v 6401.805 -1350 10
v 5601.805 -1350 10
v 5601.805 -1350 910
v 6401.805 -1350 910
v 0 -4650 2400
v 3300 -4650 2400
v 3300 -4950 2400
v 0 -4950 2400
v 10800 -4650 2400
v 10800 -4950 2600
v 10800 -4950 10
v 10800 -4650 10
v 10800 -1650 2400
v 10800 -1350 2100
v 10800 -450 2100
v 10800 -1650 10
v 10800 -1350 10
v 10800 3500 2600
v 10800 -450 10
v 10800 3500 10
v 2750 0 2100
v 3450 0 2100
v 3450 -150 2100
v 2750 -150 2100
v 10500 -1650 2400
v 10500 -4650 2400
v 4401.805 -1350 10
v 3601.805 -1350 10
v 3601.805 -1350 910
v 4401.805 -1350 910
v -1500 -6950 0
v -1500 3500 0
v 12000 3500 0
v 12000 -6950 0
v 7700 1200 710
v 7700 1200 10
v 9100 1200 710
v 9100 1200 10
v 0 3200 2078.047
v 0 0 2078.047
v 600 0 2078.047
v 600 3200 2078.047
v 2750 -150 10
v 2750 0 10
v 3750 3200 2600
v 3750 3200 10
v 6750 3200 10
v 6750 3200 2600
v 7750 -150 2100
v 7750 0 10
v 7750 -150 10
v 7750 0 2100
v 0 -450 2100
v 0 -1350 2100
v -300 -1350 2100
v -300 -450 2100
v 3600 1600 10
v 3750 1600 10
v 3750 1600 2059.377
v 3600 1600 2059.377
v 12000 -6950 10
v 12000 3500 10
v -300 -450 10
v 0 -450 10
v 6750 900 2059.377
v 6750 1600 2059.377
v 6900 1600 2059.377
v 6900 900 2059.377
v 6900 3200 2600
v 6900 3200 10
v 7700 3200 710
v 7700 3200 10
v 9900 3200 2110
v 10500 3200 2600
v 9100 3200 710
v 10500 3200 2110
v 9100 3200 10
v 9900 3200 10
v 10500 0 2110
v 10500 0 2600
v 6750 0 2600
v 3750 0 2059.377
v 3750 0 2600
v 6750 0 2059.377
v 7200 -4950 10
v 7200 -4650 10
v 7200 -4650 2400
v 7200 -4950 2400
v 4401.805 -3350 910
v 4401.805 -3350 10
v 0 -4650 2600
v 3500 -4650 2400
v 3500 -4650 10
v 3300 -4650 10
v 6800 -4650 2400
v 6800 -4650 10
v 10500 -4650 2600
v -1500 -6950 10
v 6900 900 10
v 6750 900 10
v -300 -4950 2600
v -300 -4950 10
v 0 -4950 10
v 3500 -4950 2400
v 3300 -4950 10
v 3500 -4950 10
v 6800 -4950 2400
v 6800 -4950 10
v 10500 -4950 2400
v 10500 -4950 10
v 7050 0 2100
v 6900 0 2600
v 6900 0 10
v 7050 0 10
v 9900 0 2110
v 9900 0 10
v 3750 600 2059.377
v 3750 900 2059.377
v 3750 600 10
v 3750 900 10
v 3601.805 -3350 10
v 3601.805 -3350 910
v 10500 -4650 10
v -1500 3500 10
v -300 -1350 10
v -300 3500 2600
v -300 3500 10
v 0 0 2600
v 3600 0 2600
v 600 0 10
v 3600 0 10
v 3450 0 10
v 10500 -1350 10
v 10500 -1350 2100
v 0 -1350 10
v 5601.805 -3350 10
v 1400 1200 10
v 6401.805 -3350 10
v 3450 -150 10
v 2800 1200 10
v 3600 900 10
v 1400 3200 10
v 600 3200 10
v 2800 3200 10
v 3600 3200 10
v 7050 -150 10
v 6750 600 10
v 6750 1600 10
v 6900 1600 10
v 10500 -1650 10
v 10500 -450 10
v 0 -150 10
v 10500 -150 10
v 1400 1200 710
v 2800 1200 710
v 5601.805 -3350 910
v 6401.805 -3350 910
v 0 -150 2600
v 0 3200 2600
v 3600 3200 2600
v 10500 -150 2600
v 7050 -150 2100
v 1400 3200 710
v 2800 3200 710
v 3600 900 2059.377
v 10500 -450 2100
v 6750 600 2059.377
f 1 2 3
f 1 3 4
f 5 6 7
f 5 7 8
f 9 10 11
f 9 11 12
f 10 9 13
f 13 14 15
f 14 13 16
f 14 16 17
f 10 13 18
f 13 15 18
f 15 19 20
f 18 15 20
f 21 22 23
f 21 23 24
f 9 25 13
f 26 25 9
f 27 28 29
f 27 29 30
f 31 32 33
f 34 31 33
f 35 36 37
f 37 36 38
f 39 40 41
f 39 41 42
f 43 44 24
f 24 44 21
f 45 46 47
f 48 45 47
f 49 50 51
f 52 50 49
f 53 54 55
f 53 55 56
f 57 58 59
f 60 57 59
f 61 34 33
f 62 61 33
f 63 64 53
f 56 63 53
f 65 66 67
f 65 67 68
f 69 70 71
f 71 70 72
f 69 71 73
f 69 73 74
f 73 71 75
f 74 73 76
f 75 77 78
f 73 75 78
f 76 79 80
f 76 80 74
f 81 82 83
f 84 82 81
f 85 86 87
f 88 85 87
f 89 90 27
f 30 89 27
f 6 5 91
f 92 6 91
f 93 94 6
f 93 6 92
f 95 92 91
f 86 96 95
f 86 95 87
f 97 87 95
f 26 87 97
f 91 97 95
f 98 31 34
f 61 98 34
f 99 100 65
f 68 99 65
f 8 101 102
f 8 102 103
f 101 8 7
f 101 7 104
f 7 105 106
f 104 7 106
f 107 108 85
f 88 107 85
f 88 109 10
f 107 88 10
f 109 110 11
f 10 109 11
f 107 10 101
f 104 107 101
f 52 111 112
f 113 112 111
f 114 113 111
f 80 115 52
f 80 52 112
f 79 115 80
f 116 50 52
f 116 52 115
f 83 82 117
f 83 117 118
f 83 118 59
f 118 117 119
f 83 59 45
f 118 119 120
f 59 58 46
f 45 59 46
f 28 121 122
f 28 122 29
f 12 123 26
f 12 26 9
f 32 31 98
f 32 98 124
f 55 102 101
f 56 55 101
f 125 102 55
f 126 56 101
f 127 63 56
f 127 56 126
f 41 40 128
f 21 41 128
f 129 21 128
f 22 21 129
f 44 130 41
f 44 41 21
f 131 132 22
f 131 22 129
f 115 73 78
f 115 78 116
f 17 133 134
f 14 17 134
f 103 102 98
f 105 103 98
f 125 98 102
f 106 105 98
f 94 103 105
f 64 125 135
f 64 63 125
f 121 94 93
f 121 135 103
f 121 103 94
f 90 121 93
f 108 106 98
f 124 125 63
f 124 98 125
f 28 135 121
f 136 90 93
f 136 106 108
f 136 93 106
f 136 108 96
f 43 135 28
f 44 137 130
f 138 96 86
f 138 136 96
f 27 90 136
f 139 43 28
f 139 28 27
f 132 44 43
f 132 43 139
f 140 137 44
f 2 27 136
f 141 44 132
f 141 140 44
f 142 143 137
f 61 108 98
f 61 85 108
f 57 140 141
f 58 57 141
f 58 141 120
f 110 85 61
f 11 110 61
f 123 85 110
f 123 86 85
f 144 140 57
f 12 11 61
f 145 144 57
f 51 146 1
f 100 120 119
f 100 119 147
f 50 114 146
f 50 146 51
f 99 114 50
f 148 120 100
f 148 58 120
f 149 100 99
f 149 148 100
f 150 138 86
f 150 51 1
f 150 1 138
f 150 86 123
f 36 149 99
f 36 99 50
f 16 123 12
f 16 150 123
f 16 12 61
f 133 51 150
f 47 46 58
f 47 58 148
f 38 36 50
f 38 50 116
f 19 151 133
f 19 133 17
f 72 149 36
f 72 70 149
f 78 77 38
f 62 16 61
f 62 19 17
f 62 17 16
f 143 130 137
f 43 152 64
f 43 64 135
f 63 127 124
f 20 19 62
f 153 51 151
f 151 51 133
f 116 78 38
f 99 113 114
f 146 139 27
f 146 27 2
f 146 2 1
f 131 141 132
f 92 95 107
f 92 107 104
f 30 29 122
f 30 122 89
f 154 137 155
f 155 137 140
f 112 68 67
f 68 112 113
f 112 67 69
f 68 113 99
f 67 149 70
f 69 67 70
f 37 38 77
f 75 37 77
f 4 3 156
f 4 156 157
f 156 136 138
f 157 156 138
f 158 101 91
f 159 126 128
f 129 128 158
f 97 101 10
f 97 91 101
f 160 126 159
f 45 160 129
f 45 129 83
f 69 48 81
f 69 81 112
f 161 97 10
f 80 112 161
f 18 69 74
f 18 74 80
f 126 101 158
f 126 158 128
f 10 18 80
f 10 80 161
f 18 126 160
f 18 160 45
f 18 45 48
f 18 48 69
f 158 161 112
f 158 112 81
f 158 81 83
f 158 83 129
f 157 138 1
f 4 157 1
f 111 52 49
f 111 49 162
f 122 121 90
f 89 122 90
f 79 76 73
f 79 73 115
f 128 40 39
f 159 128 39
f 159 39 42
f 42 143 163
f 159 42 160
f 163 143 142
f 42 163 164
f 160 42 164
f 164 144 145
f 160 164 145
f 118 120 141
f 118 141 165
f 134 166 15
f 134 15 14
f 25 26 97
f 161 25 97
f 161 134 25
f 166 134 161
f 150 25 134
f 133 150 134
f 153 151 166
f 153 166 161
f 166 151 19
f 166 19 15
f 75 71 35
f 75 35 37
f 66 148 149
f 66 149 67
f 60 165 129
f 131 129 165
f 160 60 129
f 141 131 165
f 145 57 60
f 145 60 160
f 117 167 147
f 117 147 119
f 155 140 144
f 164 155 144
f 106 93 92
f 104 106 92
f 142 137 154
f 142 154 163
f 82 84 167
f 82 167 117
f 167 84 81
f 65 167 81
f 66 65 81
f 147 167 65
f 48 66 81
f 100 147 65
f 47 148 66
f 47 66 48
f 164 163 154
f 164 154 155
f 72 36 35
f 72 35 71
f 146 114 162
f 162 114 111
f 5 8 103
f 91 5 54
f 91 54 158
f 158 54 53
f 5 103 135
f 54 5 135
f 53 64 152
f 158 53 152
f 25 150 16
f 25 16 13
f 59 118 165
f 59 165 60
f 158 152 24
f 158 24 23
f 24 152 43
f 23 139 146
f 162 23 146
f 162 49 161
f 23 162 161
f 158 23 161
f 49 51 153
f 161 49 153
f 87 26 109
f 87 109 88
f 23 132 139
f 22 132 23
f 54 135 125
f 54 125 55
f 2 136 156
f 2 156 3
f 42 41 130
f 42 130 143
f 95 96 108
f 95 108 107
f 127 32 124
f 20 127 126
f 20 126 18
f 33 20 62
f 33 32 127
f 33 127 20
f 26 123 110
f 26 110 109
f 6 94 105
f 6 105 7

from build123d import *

# Parameters (mm, degrees)
F0_W      = 11100
F0_H      = 8450
F0_W_2    = 10500
F0_H_2    = 4500
F0_W_3    = 3600
F0_H_3    = 3200
F0_W_4    = 3000
F1_DEPTH  = 2600
F2_W      = 700
F2_H      = 2100
F3_DEPTH  = 150
F4_W      = 900
F4_H      = 2100
F5_DEPTH  = 300
F6_W      = 900
F6_H      = 2100
F7_DEPTH  = 300
F8_W      = 3000
F8_H      = 2400
F10_DEPTH = 300
F11_W     = 3300
F11_H     = 2400
F12_DEPTH = 300
F13_W     = 13500
F13_H     = 10450
F14_DEPTH = 10
F15_W     = 3200
F15_H     = 2068.0467987061
F16_DEPTH = 600
F17_W     = 3200
F17_H     = 2100
F18_DEPTH = 600
F19_W     = 3000
F19_H     = 2049.3771934509
F20_DEPTH = 600
F21_W     = 1400
F21_H     = 2000
F22_DEPTH = 700
F23_W     = 1400
F23_H     = 2000
F24_DEPTH = 700
F25_W     = 700
F25_H     = 2049.3771934509
F26_DEPTH = 150
F27_W     = 700
F27_H     = 2049.3771934509
F28_DEPTH = 150
F29_W     = 800
F29_H     = 2000
F30_DEPTH = 900


# Not quite as in the source:
# - a feature names something its author has since deleted; it is built from what else it names


with BuildPart() as f1:
    # F0 (on Top) → F1 (new body)
    with BuildSketch(Plane.XY):
        with Locations((5250, -725)):
            Rectangle(F0_W, F0_H)
        with Locations((5250, -2400)):
            Rectangle(F0_W_2, F0_H_2, mode=Mode.SUBTRACT)
        with Locations((1800, 1600)):
            Rectangle(F0_W_3, F0_H_3, mode=Mode.SUBTRACT)
        with Locations((5250, 1600)):
            Rectangle(F0_W_4, F0_H_3, mode=Mode.SUBTRACT)
        with Locations((8700, 1600)):
            Rectangle(F0_W_3, F0_H_3, mode=Mode.SUBTRACT)
    extrude(amount=F1_DEPTH)

    # F2 (on face) → F3 (cut, through all)
    with BuildSketch(Plane(origin=(0, 0, 0), x_dir=(-1, 0, 0), z_dir=(0, 1, 0))):
        with Locations((-7400, 1050)):
            Rectangle(F2_W, F2_H)
        with Locations((-3100, 1050)):
            Rectangle(F2_W, F2_H)
    extrude(amount=-F3_DEPTH, mode=Mode.SUBTRACT)

    # F4 (on face) → F5 (cut, through all)
    with BuildSketch(Plane(origin=(10500, 0, 0), x_dir=(0, -1, 0), z_dir=(-1, 0, 0))):
        with Locations((900, 1050)):
            Rectangle(F4_W, F4_H)
    extrude(amount=-F5_DEPTH, mode=Mode.SUBTRACT)

    # F6 (on face) → F7 (cut, through all)
    with BuildSketch(Plane.YZ):
        with Locations((-900, 1050)):
            Rectangle(F6_W, F6_H)
    extrude(amount=-F7_DEPTH, mode=Mode.SUBTRACT)

    # F8 (on face) → F10 (cut, through all)
    with BuildSketch(Plane(origin=(10500, 0, 0), x_dir=(0, -1, 0), z_dir=(-1, 0, 0))):
        with Locations((3150, 1200)):
            Rectangle(F8_W, F8_H)
    extrude(amount=-F10_DEPTH, mode=Mode.SUBTRACT)

    # F11 (on face) → F12 (cut, through all)
    with BuildSketch(Plane(origin=(0, -4650, 0), x_dir=(-1, 0, 0), z_dir=(0, 1, 0))):
        with Locations((-8850, 1200)):
            Rectangle(F11_W, F11_H)
        with Locations((-5150, 1200)):
            Rectangle(F11_W, F11_H)
        with Locations((-1650, 1200)):
            Rectangle(F11_W, F11_H)
    extrude(amount=-F12_DEPTH, mode=Mode.SUBTRACT)

    # F13 (on Top) → F14 (join)
    with BuildSketch(Plane.XY):
        with Locations((5250, -1725)):
            Rectangle(F13_W, F13_H)
    extrude(amount=F14_DEPTH)

    # F15 (on face) → F16 (join)
    with BuildSketch(Plane.YZ):
        with Locations((1600, 1044.023399353)):
            Rectangle(F15_W, F15_H)
    extrude(amount=F16_DEPTH)

    # F17 (on face) → F18 (join)
    with BuildSketch(Plane(origin=(10500, 0, 0), x_dir=(0, -1, 0), z_dir=(-1, 0, 0))):
        with Locations((-1600, 1060)):
            Rectangle(F17_W, F17_H)
    extrude(amount=F18_DEPTH)

    # F19 (on face) → F20 (join)
    with BuildSketch(Plane(origin=(0, 0, 0), x_dir=(-1, 0, 0), z_dir=(0, 1, 0))):
        with Locations((-5250, 1034.6885967255)):
            Rectangle(F19_W, F19_H)
    extrude(amount=F20_DEPTH)

    # F21 (on face) → F22 (join)
    with BuildSketch(Plane.XY.offset(10)):
        with Locations((2100, 2200)):
            Rectangle(F21_W, F21_H)
    extrude(amount=F22_DEPTH)

    # F23 (on face) → F24 (join)
    with BuildSketch(Plane.XY.offset(10)):
        with Locations((8400, 2200)):
            Rectangle(F23_W, F23_H)
    extrude(amount=F24_DEPTH)

    # F25 (on face) → F26 (cut, through all)
    with BuildSketch(Plane(origin=(6750, 0, 0), x_dir=(0, -1, 0), z_dir=(-1, 0, 0))):
        with Locations((-1250, 1034.6885967255)):
            Rectangle(F25_W, F25_H)
    extrude(amount=-F26_DEPTH, mode=Mode.SUBTRACT)

    # F27 (on face) → F28 (cut, through all)
    with BuildSketch(Plane.YZ.offset(3750)):
        with Locations((1250, 1034.6885967255)):
            Rectangle(F27_W, F27_H)
    extrude(amount=-F28_DEPTH, mode=Mode.SUBTRACT)

    # F29 (on face) → F30 (join)
    with BuildSketch(Plane.XY.offset(10)):
        with Locations((4001.805305481, -2350)):
            Rectangle(F29_W, F29_H)
        with Locations((6001.805305481, -2350)):
            Rectangle(F29_W, F29_H)
    extrude(amount=F30_DEPTH)


solid = f1.part
